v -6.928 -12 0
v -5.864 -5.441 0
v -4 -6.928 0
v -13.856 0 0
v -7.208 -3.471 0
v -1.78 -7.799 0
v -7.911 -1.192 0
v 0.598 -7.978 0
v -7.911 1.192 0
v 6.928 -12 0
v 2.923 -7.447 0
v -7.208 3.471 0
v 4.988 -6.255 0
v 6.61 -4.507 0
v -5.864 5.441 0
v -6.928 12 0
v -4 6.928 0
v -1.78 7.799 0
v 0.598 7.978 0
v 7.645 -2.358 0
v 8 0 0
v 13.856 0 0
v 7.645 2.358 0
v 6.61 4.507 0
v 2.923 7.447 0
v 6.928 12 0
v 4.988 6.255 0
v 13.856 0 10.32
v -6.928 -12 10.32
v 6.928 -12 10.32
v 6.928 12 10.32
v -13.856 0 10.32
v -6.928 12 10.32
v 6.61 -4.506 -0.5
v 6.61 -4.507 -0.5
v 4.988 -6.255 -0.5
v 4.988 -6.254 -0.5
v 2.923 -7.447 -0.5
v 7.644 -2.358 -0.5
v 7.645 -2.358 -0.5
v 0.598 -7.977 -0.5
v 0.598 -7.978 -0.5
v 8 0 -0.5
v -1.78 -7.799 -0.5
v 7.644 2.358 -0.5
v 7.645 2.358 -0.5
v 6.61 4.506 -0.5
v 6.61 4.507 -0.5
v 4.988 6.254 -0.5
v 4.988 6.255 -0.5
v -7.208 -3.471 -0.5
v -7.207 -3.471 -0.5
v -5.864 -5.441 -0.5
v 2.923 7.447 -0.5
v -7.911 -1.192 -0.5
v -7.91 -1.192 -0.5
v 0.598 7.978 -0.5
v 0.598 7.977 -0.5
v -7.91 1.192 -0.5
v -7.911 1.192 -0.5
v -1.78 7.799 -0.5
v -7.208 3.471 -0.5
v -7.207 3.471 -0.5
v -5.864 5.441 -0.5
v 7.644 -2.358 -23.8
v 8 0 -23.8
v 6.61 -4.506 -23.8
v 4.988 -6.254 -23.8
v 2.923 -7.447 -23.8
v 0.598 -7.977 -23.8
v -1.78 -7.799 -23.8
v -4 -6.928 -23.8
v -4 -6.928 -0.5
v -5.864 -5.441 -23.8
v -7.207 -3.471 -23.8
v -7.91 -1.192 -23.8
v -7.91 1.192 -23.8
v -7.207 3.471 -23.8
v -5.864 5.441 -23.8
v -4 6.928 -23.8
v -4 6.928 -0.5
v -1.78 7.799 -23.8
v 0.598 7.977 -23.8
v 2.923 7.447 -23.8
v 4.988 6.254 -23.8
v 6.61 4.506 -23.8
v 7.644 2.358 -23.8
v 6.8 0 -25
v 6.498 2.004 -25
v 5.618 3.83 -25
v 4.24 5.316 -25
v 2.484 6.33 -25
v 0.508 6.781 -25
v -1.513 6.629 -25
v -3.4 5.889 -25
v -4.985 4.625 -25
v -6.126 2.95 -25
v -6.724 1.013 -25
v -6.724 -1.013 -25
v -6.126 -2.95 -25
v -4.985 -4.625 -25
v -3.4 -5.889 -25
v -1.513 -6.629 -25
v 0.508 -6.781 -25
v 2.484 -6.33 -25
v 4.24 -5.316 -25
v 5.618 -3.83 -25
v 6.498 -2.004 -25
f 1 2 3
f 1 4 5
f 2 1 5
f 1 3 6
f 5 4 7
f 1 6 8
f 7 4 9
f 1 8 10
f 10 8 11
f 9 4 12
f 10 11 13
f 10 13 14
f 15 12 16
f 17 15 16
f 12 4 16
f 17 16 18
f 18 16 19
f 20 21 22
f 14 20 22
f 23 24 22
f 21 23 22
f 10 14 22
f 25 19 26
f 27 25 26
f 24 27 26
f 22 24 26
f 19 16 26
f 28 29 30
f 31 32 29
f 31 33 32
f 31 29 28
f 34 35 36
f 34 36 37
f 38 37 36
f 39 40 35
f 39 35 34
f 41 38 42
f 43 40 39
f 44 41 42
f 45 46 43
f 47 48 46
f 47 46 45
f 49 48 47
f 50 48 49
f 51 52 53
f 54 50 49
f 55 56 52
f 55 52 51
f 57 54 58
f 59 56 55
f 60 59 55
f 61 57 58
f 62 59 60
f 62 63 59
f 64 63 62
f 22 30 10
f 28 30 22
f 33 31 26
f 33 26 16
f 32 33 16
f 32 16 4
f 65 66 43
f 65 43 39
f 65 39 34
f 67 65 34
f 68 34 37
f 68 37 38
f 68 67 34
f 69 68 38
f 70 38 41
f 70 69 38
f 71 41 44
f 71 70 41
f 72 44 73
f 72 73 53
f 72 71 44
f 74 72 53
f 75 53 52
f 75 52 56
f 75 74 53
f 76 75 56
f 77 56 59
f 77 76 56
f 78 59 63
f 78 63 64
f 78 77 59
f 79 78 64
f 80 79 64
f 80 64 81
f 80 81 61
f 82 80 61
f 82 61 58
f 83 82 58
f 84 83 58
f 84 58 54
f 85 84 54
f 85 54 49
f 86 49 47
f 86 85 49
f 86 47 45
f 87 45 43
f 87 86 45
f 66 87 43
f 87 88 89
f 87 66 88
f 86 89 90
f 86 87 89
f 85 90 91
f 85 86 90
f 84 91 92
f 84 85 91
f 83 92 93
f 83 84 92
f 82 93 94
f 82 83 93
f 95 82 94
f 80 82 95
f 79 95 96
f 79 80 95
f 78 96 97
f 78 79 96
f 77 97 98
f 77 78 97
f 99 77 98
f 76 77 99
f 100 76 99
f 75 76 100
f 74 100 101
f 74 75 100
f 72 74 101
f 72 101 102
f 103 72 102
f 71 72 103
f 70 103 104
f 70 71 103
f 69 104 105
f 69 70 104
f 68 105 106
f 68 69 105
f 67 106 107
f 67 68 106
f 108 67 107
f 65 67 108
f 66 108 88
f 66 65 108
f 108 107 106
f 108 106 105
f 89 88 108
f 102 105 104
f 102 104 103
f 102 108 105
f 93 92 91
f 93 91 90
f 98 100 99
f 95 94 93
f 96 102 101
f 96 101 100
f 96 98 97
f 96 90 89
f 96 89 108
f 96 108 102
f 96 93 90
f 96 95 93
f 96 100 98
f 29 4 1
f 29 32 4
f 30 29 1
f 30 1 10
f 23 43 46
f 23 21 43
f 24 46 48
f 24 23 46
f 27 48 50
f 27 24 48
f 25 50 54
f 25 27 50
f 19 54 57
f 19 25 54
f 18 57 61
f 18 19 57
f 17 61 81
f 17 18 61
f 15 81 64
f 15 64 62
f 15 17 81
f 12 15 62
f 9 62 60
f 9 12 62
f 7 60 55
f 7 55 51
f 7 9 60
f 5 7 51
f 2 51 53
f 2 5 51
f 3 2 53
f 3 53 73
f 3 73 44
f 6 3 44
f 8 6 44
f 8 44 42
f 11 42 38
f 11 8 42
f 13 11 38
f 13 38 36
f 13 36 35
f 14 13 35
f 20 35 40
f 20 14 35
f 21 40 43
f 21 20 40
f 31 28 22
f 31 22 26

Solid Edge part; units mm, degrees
sketch "Sketch1" plane through (0, 0, 0) normal (0, 0, 1) x (1, 0, 0)
  circle A0 centre (0, 0) radius 13.92
  dimension "D1" = 27.84
extrude "Protrusion1" add sketch "Sketch1" along normal blind 10.32
sketch "Sketch2" plane through (0, 0, 0) normal (0, 0, -1) x (1, 0, 0)
  circle A0 centre (0, 0) radius 8
extrude "Protrusion2" add sketch "Sketch2" along normal blind 25
sketch "Sketch3" plane through (0, 0, -25) normal (0, 0, -1) x (1, 0, 0)
  circle A0 centre (0, 0) radius 7.9997
extrude "Cutout1" cut sketch "Sketch3" against normal blind 24.5 flip side to cut
chamfer "Chamfer_1" distance 1.2 angle 45 1 edges at (-7.9997, 0, -25)
sketch "Sketch4" plane through (0, 0, 10.32) normal (0, 0, 1) x (1, 0, 0)
  line L0 (-7.0545, 12) -> (7.0545, 12)
  dimension "D1" = 24
extrude "Cutout2" cut sketch "Sketch4" against normal up to next material side at (0, 12.05, 10.32)
pattern_circular "Pattern1" count 6 over 360 about axis through (0, 0, 10.32) along (0, 0, 1) of "Cutout2"
properties part number "118416" material "Stainless Steel, 304"
